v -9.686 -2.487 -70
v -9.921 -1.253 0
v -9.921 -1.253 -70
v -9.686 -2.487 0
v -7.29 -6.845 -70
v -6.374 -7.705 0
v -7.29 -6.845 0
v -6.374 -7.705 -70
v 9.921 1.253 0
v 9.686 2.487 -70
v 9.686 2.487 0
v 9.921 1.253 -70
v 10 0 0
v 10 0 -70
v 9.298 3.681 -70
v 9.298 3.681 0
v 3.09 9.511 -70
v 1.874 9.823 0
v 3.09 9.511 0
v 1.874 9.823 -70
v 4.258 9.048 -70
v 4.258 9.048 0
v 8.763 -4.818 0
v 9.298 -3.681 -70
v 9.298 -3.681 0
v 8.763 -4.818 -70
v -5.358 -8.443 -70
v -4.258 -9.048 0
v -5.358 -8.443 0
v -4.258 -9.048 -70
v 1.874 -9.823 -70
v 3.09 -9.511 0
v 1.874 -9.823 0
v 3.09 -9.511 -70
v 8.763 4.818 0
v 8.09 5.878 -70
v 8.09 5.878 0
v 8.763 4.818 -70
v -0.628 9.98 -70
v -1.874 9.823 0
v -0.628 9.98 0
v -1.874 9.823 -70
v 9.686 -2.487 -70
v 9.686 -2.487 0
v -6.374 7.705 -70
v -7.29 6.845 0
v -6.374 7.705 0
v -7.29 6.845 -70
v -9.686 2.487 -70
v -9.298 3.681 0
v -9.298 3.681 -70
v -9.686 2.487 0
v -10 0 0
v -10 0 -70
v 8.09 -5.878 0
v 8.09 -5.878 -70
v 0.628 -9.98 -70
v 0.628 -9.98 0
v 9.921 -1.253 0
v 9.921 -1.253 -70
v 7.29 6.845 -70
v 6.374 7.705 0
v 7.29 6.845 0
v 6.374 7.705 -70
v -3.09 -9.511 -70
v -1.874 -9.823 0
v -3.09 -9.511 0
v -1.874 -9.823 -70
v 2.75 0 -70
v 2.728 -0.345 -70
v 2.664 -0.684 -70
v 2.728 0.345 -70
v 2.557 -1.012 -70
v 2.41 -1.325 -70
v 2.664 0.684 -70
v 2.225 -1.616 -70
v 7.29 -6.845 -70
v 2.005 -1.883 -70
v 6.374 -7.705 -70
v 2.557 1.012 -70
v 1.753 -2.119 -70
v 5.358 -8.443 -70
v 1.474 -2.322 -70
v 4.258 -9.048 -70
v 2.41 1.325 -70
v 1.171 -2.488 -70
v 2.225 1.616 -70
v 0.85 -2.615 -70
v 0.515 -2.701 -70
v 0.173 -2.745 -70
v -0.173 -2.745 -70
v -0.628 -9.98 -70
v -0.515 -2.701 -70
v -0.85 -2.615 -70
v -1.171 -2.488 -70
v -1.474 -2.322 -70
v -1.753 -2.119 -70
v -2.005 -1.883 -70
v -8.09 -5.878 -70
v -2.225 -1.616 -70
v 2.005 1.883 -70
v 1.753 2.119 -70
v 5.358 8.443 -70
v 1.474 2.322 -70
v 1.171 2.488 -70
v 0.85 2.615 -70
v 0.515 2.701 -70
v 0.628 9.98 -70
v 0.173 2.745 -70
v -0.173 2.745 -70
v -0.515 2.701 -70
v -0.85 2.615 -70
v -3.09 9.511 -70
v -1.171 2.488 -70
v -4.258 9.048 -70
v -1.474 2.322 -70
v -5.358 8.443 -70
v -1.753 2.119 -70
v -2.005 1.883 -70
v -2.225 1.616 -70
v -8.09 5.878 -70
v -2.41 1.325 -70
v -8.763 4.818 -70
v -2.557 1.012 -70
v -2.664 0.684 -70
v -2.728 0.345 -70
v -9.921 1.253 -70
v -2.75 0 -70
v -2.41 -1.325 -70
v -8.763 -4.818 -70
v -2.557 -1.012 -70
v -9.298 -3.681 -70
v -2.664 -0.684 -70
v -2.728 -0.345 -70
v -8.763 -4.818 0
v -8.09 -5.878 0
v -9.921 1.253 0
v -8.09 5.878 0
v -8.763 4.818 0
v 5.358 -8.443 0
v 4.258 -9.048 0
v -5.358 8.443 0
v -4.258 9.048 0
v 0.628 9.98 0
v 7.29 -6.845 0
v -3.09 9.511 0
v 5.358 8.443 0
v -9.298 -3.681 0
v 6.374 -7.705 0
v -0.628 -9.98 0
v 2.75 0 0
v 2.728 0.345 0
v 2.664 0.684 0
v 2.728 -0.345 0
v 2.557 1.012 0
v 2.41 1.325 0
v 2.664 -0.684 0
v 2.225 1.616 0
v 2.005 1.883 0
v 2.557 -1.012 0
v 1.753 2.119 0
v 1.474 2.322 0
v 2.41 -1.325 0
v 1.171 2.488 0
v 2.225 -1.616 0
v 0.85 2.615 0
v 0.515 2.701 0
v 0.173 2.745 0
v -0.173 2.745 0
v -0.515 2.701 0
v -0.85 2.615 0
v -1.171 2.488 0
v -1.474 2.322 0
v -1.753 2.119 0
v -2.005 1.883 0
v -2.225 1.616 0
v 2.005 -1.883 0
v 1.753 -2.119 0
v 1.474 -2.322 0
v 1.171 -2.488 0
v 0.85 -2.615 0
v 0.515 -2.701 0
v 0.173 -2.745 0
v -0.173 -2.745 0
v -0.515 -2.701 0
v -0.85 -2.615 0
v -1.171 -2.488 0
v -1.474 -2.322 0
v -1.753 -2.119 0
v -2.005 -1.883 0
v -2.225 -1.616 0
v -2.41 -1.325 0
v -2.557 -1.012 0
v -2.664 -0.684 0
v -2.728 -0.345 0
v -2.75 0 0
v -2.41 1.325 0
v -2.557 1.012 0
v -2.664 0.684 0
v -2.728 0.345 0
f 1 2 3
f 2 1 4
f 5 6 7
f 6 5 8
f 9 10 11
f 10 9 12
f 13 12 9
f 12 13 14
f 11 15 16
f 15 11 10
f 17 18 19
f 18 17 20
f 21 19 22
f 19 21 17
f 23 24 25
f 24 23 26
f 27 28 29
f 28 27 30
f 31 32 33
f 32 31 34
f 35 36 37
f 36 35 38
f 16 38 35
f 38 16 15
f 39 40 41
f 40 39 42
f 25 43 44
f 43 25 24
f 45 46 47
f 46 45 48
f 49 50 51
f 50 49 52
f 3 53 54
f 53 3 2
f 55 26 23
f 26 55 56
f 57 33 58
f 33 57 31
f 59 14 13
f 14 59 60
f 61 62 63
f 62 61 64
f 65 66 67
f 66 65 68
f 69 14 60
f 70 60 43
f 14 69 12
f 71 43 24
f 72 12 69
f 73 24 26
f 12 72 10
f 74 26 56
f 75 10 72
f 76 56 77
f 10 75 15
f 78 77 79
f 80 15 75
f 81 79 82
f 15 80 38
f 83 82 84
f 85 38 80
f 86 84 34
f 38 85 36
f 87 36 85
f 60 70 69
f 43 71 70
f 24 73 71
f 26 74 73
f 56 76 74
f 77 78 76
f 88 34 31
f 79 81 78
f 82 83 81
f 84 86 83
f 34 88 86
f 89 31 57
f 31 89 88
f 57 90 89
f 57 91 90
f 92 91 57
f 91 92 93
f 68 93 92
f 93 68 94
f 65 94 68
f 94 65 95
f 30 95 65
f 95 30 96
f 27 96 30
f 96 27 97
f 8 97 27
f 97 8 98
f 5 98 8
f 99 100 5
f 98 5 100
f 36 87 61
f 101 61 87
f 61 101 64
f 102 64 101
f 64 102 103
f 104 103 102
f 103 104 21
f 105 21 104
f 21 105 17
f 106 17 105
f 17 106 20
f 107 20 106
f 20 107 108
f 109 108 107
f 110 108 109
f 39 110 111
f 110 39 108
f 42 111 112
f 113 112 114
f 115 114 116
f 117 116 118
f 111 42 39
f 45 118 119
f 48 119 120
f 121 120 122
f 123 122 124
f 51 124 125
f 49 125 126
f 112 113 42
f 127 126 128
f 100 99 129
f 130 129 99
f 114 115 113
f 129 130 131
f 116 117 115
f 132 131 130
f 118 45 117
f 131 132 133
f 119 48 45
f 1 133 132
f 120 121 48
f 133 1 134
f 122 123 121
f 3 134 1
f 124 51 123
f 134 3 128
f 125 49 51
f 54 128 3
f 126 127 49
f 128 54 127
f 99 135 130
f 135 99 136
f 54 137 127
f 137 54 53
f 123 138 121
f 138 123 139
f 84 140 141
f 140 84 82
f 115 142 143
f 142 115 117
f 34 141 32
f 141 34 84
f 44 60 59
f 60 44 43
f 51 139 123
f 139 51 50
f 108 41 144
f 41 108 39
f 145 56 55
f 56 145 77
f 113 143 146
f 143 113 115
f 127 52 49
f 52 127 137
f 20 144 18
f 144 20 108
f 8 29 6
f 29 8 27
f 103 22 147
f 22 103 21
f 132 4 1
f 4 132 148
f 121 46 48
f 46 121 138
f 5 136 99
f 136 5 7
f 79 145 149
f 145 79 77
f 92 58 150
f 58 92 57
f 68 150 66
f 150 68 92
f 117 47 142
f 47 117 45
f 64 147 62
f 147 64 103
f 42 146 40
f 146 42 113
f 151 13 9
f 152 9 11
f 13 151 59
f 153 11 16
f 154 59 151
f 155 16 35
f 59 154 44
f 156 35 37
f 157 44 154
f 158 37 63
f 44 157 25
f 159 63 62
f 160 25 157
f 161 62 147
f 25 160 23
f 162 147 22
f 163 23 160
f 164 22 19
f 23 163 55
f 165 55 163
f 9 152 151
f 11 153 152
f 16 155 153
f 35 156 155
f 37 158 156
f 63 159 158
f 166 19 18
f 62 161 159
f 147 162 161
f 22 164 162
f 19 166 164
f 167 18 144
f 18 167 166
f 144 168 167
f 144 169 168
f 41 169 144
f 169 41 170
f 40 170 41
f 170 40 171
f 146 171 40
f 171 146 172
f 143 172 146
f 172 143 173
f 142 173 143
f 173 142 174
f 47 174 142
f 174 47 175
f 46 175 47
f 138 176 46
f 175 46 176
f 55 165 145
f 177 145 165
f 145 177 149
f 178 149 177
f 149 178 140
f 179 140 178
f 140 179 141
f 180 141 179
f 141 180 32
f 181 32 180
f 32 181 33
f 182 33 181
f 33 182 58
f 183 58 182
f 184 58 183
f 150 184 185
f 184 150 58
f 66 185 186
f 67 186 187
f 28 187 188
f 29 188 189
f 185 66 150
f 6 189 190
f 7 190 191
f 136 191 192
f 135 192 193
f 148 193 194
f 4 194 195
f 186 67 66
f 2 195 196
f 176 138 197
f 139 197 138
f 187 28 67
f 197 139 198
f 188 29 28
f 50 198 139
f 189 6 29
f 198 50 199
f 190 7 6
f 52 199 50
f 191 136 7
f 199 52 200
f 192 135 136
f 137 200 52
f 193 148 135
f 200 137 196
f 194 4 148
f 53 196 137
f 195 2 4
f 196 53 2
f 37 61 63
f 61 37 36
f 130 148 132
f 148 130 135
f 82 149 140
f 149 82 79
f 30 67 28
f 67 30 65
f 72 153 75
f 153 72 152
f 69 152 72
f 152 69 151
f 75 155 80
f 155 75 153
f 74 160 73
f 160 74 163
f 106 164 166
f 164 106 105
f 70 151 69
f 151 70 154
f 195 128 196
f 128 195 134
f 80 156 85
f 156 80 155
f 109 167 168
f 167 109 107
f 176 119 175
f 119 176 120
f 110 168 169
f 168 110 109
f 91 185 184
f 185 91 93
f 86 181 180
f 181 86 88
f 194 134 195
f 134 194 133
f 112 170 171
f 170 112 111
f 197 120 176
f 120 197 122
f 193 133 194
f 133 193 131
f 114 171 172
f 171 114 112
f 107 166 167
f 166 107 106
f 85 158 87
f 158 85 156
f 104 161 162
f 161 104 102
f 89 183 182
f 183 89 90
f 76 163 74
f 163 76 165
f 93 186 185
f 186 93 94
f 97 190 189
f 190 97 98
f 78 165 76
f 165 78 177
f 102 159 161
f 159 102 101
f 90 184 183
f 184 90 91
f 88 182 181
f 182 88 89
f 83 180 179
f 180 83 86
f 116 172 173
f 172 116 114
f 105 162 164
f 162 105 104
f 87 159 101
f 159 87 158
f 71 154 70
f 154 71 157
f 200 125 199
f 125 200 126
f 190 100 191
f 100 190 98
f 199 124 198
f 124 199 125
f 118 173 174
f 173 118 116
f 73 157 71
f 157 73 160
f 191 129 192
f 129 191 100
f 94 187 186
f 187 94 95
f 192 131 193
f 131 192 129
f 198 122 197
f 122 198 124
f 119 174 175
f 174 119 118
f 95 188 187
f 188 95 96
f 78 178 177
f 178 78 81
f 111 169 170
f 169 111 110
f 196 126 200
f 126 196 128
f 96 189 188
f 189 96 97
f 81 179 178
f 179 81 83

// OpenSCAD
$fn = 50;


difference() {
	union() {
		translate(v = [0, 0, -70.0000000000]) {
			cylinder(h = 70, r = 10.0000000000);
		}
		cylinder(h = 0, r = 19.0000000000);
	}
	union() {
		#translate(v = [0, 0, -70]) {
			cylinder(h = 70, r = 2.7500000000);
		}
	}
}
